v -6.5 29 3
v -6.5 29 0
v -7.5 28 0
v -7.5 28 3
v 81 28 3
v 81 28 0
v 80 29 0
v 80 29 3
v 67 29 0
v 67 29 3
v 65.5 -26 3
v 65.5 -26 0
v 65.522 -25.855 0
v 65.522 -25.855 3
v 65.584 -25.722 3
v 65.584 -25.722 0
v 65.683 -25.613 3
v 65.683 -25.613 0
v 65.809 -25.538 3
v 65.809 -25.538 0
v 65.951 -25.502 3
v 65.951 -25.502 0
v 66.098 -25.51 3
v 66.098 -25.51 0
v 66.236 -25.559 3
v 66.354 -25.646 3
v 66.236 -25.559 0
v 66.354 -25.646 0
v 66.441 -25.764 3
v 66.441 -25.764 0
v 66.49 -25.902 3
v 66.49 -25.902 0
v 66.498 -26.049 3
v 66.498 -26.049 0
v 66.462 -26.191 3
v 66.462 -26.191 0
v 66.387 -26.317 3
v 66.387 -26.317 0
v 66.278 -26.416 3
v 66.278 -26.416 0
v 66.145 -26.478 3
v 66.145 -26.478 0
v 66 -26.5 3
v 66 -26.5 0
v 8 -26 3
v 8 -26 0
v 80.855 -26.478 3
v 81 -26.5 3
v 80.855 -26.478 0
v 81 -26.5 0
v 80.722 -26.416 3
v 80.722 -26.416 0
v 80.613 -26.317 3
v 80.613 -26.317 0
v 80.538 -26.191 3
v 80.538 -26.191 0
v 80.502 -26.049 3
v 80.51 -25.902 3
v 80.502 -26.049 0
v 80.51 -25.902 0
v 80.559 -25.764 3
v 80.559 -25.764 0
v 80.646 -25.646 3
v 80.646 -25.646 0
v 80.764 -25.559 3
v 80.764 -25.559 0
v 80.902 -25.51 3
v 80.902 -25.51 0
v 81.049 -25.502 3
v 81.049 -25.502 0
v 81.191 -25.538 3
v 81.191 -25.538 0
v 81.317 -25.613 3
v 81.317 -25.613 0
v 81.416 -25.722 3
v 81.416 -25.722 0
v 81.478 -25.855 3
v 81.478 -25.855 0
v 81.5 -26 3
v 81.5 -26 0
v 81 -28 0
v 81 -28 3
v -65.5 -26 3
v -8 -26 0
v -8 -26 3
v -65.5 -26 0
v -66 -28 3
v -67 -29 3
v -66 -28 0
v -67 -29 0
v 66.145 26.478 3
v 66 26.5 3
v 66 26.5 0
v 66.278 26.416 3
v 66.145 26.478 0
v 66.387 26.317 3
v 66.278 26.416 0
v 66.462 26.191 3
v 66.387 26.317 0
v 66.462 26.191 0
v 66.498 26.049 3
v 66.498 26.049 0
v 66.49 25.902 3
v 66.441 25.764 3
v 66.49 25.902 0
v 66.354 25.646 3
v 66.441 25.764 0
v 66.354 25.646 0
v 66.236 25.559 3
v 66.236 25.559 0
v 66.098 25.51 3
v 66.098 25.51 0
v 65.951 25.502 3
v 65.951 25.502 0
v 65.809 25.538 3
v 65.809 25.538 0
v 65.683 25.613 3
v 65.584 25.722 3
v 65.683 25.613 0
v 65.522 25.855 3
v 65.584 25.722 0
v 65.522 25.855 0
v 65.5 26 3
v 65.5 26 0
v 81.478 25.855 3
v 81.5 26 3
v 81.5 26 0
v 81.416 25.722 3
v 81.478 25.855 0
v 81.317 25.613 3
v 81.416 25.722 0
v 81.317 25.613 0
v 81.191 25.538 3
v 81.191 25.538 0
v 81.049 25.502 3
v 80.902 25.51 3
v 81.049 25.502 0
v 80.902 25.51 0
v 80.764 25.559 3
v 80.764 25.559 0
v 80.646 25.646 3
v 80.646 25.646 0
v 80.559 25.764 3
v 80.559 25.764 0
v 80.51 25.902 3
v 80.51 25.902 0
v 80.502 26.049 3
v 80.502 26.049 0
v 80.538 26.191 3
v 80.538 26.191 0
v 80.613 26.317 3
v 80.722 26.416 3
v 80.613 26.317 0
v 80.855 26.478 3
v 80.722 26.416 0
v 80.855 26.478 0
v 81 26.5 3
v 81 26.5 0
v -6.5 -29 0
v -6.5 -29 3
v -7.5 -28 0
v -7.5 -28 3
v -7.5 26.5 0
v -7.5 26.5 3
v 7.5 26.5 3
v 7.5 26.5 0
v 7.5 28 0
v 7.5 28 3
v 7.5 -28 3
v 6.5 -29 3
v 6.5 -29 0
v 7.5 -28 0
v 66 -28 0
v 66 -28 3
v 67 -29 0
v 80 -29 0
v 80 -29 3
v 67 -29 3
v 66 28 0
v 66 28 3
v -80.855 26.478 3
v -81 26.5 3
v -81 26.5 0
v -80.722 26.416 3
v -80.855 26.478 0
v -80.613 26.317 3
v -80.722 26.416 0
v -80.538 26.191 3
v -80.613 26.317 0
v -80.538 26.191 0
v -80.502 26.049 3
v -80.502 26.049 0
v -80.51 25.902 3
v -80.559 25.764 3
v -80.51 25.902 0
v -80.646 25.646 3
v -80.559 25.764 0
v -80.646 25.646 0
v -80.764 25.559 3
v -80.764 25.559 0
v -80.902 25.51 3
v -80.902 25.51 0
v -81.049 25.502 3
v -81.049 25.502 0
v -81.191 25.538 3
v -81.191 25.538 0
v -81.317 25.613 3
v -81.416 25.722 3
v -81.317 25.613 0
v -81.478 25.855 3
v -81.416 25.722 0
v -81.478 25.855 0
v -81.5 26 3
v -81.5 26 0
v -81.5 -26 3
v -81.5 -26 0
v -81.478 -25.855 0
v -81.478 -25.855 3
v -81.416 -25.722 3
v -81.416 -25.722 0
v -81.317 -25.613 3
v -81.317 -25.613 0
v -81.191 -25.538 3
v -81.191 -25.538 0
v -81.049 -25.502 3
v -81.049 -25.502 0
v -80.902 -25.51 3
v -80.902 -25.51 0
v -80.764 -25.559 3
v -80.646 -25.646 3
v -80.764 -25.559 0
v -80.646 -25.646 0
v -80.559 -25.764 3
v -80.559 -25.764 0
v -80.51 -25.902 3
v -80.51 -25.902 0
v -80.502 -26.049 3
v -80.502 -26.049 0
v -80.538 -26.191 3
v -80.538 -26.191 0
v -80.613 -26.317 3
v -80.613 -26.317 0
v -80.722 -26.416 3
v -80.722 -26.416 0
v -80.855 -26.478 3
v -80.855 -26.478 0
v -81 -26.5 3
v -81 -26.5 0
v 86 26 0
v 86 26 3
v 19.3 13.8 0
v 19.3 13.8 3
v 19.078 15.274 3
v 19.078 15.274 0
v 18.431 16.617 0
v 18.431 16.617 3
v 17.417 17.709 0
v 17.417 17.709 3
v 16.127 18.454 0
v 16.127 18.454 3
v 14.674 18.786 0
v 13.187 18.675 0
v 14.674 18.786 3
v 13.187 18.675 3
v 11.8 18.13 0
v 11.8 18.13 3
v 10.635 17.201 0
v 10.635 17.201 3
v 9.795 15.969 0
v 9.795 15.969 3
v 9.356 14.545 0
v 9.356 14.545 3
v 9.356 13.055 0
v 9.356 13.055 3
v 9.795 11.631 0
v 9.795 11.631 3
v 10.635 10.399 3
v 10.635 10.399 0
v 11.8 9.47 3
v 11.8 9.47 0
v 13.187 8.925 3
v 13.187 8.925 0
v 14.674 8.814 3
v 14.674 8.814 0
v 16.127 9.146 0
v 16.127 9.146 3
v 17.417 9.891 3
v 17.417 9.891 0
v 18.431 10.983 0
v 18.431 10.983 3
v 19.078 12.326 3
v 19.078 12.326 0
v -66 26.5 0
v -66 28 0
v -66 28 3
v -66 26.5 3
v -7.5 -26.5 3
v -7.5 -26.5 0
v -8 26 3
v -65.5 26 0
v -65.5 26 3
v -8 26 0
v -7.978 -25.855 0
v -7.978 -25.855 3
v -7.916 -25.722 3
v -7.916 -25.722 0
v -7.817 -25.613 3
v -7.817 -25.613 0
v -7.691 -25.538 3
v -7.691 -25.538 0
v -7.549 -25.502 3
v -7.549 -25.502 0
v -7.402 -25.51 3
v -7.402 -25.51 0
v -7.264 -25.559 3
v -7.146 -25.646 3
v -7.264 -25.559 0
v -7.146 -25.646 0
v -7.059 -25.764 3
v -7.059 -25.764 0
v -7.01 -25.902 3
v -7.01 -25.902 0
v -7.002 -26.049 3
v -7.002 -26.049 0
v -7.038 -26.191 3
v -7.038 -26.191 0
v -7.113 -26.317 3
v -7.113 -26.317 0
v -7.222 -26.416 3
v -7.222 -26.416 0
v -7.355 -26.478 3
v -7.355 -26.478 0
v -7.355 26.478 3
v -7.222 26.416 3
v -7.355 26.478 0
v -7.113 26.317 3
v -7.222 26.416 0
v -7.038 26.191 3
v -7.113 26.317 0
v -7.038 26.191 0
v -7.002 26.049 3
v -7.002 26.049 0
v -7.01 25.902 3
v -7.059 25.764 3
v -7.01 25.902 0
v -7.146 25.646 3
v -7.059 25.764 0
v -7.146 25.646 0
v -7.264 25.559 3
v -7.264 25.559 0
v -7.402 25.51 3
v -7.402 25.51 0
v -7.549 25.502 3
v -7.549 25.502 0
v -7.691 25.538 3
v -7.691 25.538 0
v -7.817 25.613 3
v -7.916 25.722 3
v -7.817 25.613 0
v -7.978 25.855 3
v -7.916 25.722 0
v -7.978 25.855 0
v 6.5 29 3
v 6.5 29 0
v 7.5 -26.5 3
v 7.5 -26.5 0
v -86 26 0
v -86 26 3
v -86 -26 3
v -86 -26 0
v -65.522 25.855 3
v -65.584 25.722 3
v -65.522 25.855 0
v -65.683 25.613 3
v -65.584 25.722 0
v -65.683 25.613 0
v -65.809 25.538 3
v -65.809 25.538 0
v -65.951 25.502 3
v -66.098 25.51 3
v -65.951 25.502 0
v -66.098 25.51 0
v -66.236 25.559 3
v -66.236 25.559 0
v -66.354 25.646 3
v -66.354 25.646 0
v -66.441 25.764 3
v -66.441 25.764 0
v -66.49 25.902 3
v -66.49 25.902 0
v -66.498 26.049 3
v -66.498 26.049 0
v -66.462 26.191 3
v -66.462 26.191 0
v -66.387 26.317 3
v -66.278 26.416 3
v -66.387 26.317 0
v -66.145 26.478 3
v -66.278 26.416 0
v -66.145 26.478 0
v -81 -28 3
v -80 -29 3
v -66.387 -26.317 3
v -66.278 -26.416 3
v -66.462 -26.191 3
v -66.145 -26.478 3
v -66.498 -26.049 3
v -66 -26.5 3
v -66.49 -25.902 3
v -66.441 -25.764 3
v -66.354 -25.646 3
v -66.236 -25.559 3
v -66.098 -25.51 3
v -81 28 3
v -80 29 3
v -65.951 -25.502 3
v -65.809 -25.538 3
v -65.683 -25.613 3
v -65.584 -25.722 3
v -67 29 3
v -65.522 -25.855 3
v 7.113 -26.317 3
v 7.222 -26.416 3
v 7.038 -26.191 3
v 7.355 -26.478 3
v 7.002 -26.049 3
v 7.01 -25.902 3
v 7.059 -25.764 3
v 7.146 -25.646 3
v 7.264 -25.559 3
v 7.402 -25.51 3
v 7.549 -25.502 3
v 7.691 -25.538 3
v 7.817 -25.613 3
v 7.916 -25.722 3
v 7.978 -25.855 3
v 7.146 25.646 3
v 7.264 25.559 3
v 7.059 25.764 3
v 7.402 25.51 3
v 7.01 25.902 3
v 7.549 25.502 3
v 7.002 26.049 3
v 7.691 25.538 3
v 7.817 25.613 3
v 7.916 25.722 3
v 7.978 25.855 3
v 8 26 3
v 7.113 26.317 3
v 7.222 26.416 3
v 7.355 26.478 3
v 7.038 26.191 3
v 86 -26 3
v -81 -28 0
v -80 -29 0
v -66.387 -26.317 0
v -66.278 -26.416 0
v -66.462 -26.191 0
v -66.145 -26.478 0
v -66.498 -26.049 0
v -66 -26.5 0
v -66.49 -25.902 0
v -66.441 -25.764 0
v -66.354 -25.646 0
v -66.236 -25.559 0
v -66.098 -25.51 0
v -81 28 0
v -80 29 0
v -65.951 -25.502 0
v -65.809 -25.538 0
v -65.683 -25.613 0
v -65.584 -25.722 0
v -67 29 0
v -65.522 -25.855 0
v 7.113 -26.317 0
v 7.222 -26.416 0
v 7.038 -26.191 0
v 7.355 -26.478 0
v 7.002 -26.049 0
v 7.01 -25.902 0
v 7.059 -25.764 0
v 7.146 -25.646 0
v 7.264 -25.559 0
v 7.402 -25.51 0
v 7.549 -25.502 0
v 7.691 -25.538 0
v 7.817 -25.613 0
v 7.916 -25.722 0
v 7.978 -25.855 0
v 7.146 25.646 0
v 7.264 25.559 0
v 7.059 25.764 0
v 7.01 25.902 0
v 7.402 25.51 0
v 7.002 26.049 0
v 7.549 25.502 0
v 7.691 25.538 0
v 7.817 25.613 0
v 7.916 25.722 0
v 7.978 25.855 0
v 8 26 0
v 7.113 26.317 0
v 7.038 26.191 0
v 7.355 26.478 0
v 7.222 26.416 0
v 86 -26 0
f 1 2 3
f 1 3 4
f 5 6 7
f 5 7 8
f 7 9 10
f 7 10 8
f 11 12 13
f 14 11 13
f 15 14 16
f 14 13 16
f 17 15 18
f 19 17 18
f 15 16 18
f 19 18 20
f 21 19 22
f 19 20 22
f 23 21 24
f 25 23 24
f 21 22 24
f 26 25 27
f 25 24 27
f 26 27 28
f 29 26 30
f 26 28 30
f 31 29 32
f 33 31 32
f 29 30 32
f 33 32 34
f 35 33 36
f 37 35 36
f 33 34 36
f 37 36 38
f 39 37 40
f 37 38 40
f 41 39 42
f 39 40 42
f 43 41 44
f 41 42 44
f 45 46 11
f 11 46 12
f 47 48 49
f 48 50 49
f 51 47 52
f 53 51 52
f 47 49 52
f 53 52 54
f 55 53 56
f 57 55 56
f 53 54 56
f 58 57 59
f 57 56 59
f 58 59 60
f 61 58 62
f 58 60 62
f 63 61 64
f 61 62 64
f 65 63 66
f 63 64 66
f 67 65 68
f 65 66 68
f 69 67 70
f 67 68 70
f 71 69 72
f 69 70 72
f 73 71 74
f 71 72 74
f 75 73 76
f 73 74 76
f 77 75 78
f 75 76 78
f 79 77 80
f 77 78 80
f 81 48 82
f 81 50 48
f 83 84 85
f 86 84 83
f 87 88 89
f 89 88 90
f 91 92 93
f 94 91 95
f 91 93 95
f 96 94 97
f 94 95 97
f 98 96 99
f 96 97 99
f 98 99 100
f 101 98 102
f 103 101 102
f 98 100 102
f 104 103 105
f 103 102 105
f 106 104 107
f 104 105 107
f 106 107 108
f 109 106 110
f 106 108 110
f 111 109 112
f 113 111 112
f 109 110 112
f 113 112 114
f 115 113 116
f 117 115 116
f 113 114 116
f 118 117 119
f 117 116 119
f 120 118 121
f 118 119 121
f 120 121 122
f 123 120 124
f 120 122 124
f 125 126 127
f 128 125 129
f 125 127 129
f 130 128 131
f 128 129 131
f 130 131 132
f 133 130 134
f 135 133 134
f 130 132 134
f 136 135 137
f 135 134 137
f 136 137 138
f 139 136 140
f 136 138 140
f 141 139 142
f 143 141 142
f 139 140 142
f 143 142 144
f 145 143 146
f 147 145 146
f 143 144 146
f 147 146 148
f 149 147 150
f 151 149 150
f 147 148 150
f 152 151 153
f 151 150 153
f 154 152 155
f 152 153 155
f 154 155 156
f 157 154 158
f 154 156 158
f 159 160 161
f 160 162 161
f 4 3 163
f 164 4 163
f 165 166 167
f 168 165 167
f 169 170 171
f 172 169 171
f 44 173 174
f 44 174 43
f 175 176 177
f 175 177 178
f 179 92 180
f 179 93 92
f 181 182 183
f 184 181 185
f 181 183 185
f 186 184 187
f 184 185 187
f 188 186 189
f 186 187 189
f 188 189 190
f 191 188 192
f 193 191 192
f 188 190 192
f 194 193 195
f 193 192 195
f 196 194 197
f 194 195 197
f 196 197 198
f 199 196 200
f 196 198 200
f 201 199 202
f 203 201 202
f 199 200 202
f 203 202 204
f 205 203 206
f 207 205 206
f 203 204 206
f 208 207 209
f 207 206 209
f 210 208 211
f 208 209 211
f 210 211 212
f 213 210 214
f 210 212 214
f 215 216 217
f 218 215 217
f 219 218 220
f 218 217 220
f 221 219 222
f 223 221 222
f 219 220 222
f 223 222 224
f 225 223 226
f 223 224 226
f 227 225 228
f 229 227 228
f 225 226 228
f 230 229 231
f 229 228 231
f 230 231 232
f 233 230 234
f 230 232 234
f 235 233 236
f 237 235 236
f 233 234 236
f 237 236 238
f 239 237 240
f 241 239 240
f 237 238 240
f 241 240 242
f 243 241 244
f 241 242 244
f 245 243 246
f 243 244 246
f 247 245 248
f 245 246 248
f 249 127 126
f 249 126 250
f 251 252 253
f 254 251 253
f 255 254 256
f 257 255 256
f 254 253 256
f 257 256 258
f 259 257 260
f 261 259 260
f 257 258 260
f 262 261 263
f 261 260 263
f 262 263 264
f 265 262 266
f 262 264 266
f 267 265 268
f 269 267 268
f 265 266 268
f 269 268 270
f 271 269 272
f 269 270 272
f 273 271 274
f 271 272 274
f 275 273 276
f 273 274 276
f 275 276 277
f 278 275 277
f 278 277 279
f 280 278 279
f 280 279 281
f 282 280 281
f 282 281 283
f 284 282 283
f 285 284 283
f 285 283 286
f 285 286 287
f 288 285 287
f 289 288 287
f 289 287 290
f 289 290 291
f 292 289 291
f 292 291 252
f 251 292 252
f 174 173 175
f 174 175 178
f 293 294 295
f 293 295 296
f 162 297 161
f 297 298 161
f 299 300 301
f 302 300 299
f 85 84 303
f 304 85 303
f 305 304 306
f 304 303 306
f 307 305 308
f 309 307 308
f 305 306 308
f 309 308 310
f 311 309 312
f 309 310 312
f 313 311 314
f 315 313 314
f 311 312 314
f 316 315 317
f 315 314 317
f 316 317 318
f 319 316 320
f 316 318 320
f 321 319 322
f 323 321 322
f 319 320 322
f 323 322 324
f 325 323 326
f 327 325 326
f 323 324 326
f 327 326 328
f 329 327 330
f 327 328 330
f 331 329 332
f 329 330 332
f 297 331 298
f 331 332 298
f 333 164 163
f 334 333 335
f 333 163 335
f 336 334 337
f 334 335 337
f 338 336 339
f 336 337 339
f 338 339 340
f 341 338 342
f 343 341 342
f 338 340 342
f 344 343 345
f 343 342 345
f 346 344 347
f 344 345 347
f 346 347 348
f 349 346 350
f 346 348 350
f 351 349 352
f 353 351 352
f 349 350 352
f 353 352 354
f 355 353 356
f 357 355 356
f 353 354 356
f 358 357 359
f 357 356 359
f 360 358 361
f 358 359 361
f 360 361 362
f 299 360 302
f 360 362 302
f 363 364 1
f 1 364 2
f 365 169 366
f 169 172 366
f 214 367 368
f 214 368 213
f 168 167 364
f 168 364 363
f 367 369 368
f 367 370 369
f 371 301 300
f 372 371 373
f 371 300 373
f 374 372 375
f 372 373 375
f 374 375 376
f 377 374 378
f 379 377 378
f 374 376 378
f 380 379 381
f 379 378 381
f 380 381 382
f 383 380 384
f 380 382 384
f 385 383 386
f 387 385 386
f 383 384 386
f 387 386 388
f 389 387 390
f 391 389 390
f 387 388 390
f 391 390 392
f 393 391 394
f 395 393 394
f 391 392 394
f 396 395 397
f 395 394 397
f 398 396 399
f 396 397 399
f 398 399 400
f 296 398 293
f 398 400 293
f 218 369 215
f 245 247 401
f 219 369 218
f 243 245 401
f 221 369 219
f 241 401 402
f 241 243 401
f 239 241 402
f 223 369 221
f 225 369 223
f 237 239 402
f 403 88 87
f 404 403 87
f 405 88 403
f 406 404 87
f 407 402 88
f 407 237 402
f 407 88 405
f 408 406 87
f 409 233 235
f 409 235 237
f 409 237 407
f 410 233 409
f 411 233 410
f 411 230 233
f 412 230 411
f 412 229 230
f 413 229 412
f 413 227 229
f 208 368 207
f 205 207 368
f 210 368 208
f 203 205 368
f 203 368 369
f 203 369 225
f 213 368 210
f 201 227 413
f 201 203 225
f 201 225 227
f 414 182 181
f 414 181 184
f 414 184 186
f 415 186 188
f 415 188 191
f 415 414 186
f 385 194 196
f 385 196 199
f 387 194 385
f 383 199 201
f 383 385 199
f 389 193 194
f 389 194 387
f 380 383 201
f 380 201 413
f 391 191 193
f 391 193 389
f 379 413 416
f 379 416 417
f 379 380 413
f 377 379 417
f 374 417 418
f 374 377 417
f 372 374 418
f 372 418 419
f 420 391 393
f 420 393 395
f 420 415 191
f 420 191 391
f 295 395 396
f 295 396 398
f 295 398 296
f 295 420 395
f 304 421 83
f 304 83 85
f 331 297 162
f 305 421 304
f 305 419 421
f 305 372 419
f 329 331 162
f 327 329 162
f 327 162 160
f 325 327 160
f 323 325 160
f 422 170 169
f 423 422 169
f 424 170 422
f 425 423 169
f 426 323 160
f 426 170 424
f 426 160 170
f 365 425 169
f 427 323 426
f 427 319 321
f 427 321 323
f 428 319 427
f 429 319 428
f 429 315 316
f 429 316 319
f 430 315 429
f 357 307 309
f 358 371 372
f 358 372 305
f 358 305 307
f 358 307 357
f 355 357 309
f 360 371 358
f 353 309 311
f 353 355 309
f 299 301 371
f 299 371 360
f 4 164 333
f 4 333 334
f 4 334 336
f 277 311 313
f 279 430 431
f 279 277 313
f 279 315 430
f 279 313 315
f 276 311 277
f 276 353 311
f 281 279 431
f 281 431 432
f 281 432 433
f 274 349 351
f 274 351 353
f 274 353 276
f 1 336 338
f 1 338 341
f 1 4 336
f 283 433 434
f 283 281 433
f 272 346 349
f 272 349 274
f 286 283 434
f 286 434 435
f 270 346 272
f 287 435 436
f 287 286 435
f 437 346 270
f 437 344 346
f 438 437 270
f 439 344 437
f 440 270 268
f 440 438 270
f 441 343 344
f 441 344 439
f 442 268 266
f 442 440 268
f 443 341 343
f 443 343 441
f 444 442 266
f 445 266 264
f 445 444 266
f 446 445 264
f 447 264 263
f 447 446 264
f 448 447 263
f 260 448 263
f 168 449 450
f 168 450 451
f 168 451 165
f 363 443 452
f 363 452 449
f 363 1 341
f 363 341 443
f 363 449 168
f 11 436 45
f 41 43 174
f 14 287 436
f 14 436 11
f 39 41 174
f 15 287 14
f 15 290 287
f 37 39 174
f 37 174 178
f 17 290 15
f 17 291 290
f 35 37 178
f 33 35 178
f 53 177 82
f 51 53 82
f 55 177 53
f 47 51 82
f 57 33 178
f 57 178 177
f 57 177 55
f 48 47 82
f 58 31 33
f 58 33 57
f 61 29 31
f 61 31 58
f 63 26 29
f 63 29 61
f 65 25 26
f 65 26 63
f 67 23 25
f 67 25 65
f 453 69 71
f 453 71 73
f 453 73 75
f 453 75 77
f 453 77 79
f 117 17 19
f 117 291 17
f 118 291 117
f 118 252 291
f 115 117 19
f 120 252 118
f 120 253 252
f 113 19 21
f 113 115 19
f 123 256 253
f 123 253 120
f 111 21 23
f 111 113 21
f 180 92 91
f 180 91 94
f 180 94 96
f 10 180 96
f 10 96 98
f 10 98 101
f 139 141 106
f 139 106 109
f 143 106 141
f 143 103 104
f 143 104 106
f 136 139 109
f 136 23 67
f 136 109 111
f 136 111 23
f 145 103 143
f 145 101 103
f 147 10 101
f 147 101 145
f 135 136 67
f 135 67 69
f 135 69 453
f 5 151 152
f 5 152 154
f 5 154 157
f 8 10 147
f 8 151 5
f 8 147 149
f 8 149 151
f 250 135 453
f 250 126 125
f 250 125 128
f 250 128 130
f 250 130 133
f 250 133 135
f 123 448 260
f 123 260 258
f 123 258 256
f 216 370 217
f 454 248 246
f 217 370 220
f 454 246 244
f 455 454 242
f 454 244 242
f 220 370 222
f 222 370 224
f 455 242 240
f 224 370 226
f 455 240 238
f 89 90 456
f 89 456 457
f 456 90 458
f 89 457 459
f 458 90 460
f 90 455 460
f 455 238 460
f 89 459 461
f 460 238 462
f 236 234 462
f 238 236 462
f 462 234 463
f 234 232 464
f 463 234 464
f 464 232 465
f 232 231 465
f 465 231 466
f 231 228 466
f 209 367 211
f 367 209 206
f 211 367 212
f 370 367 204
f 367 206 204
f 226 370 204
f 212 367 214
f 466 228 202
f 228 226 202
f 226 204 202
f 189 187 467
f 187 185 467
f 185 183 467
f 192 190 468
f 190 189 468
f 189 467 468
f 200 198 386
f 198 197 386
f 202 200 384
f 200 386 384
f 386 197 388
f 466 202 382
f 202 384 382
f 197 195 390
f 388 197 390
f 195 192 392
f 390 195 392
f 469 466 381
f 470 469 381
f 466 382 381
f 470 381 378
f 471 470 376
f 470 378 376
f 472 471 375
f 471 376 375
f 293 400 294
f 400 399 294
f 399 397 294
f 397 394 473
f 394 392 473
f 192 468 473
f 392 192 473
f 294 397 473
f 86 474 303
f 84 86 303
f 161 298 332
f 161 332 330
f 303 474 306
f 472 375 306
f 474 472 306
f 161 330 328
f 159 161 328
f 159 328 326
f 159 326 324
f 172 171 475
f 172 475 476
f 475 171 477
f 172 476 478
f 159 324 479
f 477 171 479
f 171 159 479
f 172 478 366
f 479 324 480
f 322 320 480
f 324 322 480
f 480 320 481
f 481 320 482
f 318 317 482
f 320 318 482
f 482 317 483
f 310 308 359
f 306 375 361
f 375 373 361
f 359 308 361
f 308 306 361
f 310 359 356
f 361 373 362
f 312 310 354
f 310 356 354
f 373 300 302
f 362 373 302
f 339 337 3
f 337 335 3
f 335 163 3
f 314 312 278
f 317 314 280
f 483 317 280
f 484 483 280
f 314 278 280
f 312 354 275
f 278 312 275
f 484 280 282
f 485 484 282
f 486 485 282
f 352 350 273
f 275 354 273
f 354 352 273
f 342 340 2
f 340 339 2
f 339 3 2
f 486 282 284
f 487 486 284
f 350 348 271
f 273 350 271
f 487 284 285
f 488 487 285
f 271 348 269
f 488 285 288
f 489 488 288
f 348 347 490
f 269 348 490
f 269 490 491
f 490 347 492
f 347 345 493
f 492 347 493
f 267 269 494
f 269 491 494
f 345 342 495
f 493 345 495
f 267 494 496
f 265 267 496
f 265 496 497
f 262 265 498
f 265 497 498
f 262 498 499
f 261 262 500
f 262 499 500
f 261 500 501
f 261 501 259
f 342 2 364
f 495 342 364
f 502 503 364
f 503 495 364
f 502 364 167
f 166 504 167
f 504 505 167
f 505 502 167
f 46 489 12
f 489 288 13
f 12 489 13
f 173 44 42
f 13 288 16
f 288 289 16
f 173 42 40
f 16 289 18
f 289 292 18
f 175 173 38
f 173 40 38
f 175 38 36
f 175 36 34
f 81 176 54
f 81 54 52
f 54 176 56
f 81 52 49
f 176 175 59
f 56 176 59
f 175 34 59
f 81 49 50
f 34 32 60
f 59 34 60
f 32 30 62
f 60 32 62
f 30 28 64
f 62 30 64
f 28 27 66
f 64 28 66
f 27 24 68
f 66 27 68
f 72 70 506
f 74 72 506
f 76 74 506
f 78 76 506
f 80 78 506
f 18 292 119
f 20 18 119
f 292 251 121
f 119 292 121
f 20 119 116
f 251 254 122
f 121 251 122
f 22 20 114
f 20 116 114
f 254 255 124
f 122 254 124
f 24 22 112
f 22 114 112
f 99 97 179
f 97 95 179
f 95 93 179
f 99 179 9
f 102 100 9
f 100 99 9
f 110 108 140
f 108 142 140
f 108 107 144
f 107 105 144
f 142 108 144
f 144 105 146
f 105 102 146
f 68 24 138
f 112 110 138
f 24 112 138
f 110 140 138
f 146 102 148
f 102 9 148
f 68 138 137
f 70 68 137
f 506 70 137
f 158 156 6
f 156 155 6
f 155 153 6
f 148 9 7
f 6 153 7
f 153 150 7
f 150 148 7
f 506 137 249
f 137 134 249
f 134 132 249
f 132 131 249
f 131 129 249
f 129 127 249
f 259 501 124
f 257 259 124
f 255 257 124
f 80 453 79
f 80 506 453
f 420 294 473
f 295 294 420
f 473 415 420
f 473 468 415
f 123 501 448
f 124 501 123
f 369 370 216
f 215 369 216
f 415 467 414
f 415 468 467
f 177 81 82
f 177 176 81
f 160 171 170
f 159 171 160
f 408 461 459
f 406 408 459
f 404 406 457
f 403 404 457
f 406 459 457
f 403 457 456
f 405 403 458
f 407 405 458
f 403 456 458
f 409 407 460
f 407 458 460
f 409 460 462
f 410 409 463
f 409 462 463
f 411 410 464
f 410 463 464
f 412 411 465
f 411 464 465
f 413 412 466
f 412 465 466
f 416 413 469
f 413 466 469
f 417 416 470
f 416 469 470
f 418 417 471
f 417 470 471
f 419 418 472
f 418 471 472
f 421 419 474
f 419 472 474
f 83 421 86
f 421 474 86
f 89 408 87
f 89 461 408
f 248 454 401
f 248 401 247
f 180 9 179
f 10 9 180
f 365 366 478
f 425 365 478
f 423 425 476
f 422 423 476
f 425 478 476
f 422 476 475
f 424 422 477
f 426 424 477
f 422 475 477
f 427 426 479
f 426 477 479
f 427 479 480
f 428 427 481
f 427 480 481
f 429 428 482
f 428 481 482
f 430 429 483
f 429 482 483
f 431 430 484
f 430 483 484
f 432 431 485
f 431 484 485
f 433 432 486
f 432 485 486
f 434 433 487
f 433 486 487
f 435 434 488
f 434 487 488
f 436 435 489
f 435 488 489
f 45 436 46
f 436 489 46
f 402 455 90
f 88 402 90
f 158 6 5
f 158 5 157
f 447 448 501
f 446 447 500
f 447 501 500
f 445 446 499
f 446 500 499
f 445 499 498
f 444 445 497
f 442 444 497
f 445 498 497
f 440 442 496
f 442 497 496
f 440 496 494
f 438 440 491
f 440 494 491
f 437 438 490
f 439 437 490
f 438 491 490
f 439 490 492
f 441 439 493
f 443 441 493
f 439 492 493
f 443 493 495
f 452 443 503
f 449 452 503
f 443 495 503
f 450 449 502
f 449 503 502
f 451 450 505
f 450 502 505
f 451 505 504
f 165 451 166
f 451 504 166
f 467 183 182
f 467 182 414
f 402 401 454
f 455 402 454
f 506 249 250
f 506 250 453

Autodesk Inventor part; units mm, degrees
ref_plane "Plan YZ" through (0, 0, 0) normal (1, 0, 0) x (0, 1, 0)
ref_plane "Plan XZ" through (0, 0, 0) normal (0, 1, 0) x (-1, 0, 0)
ref_plane "Plan XY" through (0, 0, 0) normal (0, 0, 1) x (1, 0, 0)
sketch "Esquisse12" plane through (0, 0, 0) normal (0, 0, 1) x (1, 0, 0)
  line L0 (-86, -26) -> (-86, 26)
  line L1 (-86, 26) -> (-81, 26)
  line L2 (-81, 26) -> (-81, 29)
  line L3 (-81, 29) -> (-66, 29)
  line L4 (-66, 29) -> (-66, 26)
  line L5 (7.5, 26) -> (7.5, 29)
  line L6 (7.5, 29) -> (-7.5, 29)
  line L7 (-7.5, 29) -> (-7.5, 26)
  line L8 (66, 26) -> (66, 29)
  line L9 (66, 29) -> (81, 29)
  line L10 (81, 29) -> (81, 26)
  line L11 (81, 26) -> (86, 26)
  line L12 (86, 26) -> (86, -26)
  line L13 (86, -26) -> (81, -26)
  line L14 (81, -26) -> (81, -29)
  line L15 (81, -29) -> (66, -29)
  line L16 (66, -29) -> (66, -26)
  line L17 (-7.5, -26) -> (-7.5, -29)
  line L18 (7.5, -29) -> (7.5, -26)
  line L19 (-66, -26) -> (-66, -29)
  line L20 (-81, -29) -> (-81, -26)
  line L21 (-86, -26) -> (-81, -26)
  line L22 (-81, -29) -> (-66, -29)
  line L23 (7.5, -29) -> (-7.5, -29)
  line L24 (-66, 26) -> (-7.5, 26)
  line L25 (7.5, 26) -> (66, 26)
  line L26 (7.5, -26) -> (66, -26)
  line L27 (-7.5, -26) -> (-66, -26)
  line L28 (-120.4, 0) -> (120.4, 0) construction
  line L29 (0, -40.6) -> (0, 40.6) construction
  point P0 (0, 0)
  dimension "d86" = 52
  dimension "d87" = 3
  dimension "d88" = 5
  dimension "d90" = 15
  dimension "d112" = 172
extrude "Extrusion5" add sketch "Esquisse12" along normal blind 3
sketch "Esquisse13" plane through (0, 0, 3) normal (0, 0, 1) x (1, 0, 0)
  point P0 (0, 0)
  point P1 (-81, 26)
  point P2 (-66, 26)
  point P3 (-81, -26)
  point P4 (-66, -26)
  point P5 (-7.5, -26)
  point P6 (7.5, -26)
  point P7 (66, -26)
  point P8 (81, -26)
  point P9 (81, 26)
  point P10 (66, 26)
  point P11 (-7.5, 26)
  point P12 (7.5, 26)
hole "Perçage6" at (-81, 26, 3) at (-66, 26, 3) at (-81, -26, 3) at (-66, -26, 3) at (-7.5, -26, 3) at (7.5, -26, 3) at (66, -26, 3) at (81, -26, 3) at (81, 26, 3) at (66, 26, 3) at (-7.5, 26, 3) at (7.5, 26, 3) direction (0, 0, -1) diameter 1 end through all
chamfer "Chanfrein3" distance 1 angle 45 12 edges at (-81, 29, 1.5) (-66, 29, 1.5) (-7.5, 29, 1.5) (7.5, 29, 1.5) (66, 29, 1.5) (81, 29, 1.5) (-81, -29, 1.5) (-66, -29, 1.5) (-7.5, -29, 1.5) (7.5, -29, 1.5) (66, -29, 1.5) (81, -29, 1.5)
sketch "Esquisse14" plane through (0, 0, 3) normal (0, 0, 1) x (1, 0, 0)
  circle A0 centre (14.3, 13.8) radius 5
  line L0 (-86, -26) -> (-86, 26) projected
  line L1 (65.5, -26) -> (8, -26) projected
  point P0 (0, 0)
  dimension "d107" = 100.3
  dimension "d108" = 39.8
  dimension "d109" = 10
extrude "Extrusion6" cut sketch "Esquisse14" against normal through all
properties part number "P1704_203" material "Plastique PMMA"
